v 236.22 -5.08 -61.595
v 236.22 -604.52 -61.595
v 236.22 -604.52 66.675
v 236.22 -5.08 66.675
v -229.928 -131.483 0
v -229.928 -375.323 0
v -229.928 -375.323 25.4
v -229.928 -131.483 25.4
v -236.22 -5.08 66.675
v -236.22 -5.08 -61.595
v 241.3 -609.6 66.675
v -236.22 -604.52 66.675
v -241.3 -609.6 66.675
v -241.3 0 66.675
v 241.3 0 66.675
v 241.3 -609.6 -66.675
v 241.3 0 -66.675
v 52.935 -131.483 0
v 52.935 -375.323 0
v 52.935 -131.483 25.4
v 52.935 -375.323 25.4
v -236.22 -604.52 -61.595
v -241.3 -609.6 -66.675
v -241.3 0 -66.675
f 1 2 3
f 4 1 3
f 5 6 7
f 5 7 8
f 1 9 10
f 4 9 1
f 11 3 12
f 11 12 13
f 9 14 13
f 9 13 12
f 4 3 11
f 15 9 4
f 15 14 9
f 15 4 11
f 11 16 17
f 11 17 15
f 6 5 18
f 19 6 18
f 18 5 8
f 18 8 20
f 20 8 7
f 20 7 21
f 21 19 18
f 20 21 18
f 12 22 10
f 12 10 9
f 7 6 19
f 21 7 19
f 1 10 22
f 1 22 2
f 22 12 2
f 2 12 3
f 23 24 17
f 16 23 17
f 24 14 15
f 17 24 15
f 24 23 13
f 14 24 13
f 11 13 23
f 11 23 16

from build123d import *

# Parameters (mm, degrees)
F0_W     = 482.6
F0_H     = 133.35
F1_DEPTH = 609.6
F2_W     = 282.863241
F2_H     = 243.84
F3_DEPTH = 25.4
F4_T     = -5.08


with BuildPart() as f1:
    # F0 (on Front) → F1 (new body)
    with BuildSketch(Plane.XZ):
        Rectangle(F0_W, F0_H)
    extrude(amount=F1_DEPTH)

    # F4
    f4_openings = [f1.faces().sort_by_distance(p)[0] for p in [
        (0, -304.8, 66.675),
    ]]
    offset(amount=F4_T, openings=f4_openings)


with BuildPart() as f3:
    # F2 (on Top) → F3 (new body)
    with BuildSketch(Plane.XY):
        with Locations((-88.496752, -253.402796)):
            Rectangle(F2_W, F2_H)
    extrude(amount=F3_DEPTH)


solid = Compound([f1.part, f3.part])
